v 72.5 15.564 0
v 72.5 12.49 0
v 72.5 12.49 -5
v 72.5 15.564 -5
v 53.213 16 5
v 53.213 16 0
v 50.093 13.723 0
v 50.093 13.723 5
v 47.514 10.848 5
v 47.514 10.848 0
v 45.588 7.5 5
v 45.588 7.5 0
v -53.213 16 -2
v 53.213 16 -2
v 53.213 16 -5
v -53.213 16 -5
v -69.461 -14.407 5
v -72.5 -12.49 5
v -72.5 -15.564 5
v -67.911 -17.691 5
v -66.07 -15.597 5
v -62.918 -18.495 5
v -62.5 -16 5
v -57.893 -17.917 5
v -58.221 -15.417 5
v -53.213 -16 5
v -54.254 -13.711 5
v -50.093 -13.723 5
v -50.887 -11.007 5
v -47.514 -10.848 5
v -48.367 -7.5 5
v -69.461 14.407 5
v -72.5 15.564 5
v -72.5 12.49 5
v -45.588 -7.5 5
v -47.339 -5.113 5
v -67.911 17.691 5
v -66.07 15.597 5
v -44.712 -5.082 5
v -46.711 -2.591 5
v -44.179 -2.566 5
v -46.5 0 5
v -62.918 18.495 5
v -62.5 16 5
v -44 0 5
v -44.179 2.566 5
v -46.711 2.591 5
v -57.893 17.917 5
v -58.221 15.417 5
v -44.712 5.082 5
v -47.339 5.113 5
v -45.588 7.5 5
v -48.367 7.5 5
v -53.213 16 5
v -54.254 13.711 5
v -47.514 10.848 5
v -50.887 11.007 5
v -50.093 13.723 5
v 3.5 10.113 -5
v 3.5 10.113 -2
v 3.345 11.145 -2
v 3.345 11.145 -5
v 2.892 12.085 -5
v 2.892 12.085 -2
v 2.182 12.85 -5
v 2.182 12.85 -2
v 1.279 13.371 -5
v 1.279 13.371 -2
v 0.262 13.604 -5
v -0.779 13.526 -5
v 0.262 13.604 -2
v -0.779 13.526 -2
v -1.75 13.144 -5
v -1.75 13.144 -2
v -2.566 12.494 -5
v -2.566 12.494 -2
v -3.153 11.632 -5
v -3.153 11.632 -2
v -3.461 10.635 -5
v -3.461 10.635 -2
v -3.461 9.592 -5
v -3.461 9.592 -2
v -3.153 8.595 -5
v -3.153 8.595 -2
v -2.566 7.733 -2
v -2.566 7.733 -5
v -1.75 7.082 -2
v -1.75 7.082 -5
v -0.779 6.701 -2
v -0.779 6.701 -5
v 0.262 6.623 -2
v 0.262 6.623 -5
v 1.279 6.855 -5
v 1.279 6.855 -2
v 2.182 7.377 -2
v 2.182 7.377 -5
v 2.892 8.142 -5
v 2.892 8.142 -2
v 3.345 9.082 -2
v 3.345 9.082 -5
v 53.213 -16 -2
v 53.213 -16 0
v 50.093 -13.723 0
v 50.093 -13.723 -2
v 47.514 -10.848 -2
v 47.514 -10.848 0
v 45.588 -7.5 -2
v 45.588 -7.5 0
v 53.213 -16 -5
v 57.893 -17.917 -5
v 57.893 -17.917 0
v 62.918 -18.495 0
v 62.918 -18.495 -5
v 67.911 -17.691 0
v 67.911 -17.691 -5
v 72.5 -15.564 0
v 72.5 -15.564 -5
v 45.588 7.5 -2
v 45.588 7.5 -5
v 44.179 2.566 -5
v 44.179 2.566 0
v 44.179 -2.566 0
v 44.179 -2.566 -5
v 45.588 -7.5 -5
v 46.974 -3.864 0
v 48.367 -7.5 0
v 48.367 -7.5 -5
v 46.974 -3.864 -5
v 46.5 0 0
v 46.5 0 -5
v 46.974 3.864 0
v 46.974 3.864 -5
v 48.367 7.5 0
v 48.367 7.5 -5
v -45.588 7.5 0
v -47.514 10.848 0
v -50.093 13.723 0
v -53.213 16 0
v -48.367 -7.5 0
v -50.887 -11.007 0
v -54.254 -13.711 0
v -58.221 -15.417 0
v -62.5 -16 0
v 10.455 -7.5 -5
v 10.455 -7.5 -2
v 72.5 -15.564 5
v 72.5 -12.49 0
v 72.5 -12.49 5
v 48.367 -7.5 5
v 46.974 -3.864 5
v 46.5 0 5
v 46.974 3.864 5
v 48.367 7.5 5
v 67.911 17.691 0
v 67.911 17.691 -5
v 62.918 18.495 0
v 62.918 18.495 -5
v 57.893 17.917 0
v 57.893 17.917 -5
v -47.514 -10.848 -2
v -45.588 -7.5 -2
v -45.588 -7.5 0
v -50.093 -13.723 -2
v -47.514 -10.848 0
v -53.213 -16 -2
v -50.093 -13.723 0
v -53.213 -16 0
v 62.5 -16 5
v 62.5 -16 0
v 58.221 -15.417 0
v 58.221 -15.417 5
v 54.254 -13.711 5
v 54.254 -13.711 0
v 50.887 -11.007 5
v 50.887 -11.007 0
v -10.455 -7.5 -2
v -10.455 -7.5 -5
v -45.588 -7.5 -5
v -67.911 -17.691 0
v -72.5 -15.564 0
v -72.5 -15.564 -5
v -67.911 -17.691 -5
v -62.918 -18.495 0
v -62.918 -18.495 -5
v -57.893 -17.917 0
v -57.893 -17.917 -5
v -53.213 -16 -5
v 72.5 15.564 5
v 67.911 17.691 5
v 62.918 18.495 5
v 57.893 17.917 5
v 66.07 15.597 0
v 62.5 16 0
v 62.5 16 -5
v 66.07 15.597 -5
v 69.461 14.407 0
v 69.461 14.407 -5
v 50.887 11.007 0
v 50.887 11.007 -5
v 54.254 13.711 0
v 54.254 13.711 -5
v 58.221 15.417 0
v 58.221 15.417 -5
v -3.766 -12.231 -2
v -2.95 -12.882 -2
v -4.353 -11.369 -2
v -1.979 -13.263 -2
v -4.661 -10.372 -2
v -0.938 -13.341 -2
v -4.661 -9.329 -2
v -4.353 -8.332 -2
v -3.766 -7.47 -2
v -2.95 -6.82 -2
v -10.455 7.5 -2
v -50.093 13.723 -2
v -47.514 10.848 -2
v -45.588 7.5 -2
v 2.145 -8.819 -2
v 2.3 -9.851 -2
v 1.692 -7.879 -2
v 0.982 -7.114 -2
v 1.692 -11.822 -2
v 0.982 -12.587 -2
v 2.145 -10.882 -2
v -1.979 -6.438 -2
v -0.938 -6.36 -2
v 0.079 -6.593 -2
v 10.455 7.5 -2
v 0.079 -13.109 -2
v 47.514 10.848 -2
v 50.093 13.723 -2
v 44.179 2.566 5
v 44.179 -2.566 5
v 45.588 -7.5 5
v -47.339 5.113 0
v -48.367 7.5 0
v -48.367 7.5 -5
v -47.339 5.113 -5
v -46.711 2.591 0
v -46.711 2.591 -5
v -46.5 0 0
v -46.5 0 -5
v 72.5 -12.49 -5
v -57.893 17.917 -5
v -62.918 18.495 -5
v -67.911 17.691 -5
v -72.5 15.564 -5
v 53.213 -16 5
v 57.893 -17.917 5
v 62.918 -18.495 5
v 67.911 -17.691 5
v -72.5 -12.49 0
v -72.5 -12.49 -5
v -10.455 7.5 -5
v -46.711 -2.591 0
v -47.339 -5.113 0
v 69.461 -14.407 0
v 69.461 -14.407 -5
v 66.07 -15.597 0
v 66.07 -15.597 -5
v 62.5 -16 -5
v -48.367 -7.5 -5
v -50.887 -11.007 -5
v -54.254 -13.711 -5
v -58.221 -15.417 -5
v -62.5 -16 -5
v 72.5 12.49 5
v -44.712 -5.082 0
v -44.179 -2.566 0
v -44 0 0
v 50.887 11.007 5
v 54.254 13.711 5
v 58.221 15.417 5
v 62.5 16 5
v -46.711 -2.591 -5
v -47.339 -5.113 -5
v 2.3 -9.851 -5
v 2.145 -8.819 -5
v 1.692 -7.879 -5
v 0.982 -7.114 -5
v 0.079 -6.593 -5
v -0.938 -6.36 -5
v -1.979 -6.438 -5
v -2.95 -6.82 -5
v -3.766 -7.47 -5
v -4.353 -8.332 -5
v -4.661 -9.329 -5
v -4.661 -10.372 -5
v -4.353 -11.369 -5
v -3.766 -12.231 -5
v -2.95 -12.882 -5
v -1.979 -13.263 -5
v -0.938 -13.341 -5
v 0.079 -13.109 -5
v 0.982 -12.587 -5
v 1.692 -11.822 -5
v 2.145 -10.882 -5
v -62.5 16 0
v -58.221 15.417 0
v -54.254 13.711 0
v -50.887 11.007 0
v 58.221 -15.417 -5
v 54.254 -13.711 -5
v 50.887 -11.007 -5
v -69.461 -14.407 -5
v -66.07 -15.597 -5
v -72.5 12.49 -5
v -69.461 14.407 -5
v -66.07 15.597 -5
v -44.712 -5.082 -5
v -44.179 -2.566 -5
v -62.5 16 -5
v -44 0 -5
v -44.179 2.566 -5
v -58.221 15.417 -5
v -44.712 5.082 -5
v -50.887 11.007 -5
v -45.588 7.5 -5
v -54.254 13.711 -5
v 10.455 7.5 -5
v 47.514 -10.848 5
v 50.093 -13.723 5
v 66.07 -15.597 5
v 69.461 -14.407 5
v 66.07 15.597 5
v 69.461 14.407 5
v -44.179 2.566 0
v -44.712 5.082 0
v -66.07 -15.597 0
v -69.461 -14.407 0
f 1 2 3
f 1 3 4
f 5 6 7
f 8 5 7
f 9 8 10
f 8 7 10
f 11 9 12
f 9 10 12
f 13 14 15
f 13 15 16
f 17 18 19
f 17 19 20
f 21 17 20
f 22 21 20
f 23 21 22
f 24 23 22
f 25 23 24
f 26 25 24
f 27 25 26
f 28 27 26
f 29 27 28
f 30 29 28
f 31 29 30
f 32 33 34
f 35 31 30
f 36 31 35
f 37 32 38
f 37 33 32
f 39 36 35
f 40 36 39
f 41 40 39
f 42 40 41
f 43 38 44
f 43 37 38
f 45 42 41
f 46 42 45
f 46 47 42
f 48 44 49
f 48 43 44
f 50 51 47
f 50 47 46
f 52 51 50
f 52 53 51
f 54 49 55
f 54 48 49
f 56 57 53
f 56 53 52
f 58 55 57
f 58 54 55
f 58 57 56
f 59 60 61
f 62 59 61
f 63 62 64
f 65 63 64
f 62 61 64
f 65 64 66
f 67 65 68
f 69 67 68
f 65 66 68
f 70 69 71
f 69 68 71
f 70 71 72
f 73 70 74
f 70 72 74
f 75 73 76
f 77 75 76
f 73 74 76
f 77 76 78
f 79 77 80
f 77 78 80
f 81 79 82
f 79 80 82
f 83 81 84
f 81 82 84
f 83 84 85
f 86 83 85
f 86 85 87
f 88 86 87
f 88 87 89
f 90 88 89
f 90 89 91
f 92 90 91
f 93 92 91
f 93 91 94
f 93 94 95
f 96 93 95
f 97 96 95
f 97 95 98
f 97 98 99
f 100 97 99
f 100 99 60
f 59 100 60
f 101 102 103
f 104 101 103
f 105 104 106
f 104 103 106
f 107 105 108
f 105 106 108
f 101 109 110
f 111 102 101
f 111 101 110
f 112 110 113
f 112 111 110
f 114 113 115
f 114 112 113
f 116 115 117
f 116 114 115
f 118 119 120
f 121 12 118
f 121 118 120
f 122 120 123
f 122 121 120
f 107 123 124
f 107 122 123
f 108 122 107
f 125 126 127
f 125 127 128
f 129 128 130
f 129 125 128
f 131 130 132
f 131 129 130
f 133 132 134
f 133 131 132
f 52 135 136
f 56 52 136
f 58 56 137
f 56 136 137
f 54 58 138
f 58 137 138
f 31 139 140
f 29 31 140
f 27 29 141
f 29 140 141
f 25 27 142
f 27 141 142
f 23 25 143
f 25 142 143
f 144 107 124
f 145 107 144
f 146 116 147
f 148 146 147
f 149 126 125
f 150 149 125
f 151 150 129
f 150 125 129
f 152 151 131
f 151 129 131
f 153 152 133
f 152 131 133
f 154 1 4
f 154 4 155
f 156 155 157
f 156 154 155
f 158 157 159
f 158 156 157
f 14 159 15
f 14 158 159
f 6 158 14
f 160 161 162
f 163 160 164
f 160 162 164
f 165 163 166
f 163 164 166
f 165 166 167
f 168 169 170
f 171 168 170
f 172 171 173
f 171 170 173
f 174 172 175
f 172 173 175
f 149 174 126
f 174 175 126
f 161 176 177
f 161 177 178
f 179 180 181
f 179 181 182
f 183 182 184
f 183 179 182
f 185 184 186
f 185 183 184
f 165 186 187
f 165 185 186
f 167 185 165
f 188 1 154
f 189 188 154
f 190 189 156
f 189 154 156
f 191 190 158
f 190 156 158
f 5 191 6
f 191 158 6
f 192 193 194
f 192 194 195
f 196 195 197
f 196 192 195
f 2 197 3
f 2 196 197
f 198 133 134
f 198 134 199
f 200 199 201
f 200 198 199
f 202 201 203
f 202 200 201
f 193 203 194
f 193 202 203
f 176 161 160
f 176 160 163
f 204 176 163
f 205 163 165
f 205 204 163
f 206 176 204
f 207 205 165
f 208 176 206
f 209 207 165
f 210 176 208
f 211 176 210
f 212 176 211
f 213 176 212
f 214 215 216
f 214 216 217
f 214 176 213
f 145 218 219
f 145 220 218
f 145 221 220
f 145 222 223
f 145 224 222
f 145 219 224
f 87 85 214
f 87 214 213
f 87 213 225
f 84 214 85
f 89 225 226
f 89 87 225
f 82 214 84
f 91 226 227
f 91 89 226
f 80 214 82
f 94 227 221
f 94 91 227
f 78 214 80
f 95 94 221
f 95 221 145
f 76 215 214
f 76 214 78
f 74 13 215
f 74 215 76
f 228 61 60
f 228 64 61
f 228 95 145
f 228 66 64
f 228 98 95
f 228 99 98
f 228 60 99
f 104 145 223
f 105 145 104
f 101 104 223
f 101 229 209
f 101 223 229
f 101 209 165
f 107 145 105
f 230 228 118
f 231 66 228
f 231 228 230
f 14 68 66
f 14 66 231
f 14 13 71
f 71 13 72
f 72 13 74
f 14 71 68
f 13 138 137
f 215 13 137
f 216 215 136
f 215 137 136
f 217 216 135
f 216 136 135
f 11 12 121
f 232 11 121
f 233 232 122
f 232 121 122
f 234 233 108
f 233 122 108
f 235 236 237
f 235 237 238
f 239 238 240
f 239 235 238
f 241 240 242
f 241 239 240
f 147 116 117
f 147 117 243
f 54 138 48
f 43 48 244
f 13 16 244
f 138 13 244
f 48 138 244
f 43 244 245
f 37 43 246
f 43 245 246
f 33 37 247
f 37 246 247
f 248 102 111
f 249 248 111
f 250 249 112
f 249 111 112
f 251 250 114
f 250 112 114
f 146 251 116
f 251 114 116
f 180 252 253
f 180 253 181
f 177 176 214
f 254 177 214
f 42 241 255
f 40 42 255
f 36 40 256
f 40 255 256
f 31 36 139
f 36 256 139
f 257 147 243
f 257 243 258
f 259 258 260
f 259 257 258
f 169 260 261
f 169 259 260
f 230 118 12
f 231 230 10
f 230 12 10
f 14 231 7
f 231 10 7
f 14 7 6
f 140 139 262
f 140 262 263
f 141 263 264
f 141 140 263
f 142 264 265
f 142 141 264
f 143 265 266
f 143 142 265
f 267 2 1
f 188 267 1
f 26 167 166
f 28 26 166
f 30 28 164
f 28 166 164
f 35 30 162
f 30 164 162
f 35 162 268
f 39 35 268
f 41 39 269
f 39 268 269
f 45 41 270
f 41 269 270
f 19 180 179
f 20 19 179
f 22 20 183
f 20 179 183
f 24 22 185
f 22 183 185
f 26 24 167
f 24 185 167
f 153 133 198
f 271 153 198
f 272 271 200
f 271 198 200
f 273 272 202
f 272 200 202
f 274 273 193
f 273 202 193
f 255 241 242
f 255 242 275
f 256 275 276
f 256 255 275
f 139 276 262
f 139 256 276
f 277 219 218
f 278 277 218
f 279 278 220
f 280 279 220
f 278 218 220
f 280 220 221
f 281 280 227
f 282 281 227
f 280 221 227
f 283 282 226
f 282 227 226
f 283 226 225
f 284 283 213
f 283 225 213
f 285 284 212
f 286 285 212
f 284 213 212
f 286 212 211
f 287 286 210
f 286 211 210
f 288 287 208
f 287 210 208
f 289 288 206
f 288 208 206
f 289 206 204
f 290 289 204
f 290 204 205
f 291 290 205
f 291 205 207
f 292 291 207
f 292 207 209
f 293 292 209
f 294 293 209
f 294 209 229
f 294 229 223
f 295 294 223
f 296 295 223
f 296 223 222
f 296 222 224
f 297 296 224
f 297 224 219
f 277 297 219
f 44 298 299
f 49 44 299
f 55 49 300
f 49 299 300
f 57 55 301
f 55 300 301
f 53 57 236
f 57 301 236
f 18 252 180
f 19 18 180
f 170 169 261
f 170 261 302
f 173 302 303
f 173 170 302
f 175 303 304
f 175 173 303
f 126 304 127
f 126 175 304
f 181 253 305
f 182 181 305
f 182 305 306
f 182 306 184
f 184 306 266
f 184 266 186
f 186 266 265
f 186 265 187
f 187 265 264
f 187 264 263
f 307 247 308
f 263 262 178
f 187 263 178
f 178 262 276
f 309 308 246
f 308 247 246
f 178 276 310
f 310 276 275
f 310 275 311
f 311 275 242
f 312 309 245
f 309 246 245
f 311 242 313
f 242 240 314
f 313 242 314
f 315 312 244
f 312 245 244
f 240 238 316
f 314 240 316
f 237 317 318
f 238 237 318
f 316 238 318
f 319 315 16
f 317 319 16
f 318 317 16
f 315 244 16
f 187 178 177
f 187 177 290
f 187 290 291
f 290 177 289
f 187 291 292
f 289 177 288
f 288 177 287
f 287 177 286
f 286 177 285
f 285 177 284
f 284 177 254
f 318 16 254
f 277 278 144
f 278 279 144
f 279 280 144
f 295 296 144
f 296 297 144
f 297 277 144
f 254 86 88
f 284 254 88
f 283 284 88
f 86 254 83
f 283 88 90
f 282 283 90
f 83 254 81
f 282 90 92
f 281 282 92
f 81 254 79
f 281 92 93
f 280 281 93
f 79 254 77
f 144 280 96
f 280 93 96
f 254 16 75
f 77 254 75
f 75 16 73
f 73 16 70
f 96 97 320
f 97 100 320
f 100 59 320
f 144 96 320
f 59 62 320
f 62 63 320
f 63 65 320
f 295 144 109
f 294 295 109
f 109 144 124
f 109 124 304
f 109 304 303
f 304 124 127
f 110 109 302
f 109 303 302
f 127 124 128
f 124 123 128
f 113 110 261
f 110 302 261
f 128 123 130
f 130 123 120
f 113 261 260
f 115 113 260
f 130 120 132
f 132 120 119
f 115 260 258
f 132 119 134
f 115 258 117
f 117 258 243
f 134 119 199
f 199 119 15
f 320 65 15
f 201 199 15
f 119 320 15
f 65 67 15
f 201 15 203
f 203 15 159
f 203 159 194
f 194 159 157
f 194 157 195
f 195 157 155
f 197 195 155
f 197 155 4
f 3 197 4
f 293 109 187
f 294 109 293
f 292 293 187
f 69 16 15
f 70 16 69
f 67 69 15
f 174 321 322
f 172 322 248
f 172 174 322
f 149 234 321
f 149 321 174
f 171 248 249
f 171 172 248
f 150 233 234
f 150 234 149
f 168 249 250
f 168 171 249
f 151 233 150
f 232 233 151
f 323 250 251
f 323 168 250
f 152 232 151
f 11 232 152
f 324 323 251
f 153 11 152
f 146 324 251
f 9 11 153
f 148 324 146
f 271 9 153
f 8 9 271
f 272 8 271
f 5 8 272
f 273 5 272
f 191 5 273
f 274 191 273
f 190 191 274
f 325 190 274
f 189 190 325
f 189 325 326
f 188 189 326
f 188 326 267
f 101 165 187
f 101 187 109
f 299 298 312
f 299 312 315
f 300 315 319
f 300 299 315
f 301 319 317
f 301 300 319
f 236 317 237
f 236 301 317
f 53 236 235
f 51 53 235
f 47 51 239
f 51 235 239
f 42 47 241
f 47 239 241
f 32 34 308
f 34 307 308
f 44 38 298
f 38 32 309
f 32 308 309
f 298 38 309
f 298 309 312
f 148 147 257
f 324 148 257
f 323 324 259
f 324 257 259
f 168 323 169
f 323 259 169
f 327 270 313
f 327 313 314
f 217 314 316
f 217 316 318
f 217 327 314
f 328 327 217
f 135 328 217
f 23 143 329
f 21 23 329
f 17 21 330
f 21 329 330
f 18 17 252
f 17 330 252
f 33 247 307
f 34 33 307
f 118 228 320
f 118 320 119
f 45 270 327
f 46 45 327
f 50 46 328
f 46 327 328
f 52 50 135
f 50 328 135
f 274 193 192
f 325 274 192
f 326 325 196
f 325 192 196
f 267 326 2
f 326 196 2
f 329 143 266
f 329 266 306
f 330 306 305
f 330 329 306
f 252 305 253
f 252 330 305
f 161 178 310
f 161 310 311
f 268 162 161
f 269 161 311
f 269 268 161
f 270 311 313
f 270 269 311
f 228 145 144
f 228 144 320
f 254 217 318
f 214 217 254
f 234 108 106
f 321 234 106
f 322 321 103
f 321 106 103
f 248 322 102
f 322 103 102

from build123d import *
from build123d import SkipClean  # not in build123d's __all__

# Parameters (mm, degrees)
F0_W     = 20.9095849469
F0_H     = 15
F1_DEPTH = 5
F2_DEPTH = 5
F3_R     = 3.5
F4_DEPTH = 2
F5_DEPTH = 5


# Not quite as in the source:
# - after a boolean that leaves OpenCascade's solid faulty, fix() repairs it


with BuildPart() as f1:
    # F0 (on Top) → F1 (new body)
    with BuildSketch(Plane.XY):
        with BuildLine():
            Line((-62.5, 16), (-53.2129121895, 16))
            ThreePointArc((-53.2129121895, 16), (-62.9177339073, 18.4952831388), (-72.5, 15.5643824163))
            Line((-72.5, 15.5643824163), (-72.5, 12.4899959968))
            ThreePointArc((-72.5, 12.4899959968), (-67.7990595416, 15.0970185128), (-62.5, 16))
        make_face()
        with BuildLine():
            ThreePointArc((-72.5, -15.5643824163), (-62.9177339073, -18.4952831388), (-53.2129121895, -16))
            Line((-53.2129121895, -16), (-62.5, -16))
            ThreePointArc((-62.5, -16), (-67.7990595416, -15.0970185128), (-72.5, -12.4899959968))
            Line((-72.5, -12.4899959968), (-72.5, -15.5643824163))
        make_face()
        with BuildLine():
            Line((-48.3667059749, 7.5), (-45.5884654747, 7.5))
            ThreePointArc((-45.5884654747, 7.5), (-48.7284912565, 12.3529570114), (-53.2129121895, 16))
            Line((-53.2129121895, 16), (-62.5, 16))
            ThreePointArc((-62.5, 16), (-54.2537887488, 13.7113092008), (-48.3667059749, 7.5))
        make_face()
        with BuildLine():
            ThreePointArc((-53.2129121895, -16), (-48.7284912565, -12.3529570114), (-45.5884654747, -7.5))
            Line((-45.5884654747, -7.5), (-48.3667059749, -7.5))
            ThreePointArc((-48.3667059749, -7.5), (-54.2537887488, -13.7113092008), (-62.5, -16))
            Line((-62.5, -16), (-53.2129121895, -16))
        make_face()
        with BuildLine():
            ThreePointArc((-44, 0), (-44.4014725914, 3.8331847909), (-45.5884654747, 7.5))
            Line((-45.5884654747, 7.5), (-48.3667059749, 7.5))
            ThreePointArc((-48.3667059749, 7.5), (-46.9736883903, 3.86440782), (-46.5, 0))
            ThreePointArc((-46.5, 0), (-46.9736883903, -3.86440782), (-48.3667059749, -7.5))
            Line((-48.3667059749, -7.5), (-45.5884654747, -7.5))
            ThreePointArc((-45.5884654747, -7.5), (-44.4014725914, -3.8331847909), (-44, 0))
        make_face()
        with BuildLine():
            ThreePointArc((-72.5, -15.5643824163), (-62.9177339073, -18.4952831388), (-53.2129121895, -16))
            Line((-53.2129121895, -16), (-62.5, -16))
            ThreePointArc((-62.5, -16), (-67.7990595416, -15.0970185128), (-72.5, -12.4899959968))
            Line((-72.5, -12.4899959968), (-72.5, -15.5643824163))
        make_face()
        with BuildLine():
            Line((-62.5, 16), (-53.2129121895, 16))
            ThreePointArc((-53.2129121895, 16), (-62.9177339073, 18.4952831388), (-72.5, 15.5643824163))
            Line((-72.5, 15.5643824163), (-72.5, 12.4899959968))
            ThreePointArc((-72.5, 12.4899959968), (-67.7990595416, 15.0970185128), (-62.5, 16))
        make_face()
        with BuildLine():
            ThreePointArc((72.5, 15.5643824163), (62.9177339073, 18.4952831388), (53.2129121895, 16))
            Line((53.2129121895, 16), (62.5, 16))
            ThreePointArc((62.5, 16), (67.7990595416, 15.0970185128), (72.5, 12.4899959968))
            Line((72.5, 12.4899959968), (72.5, 15.5643824163))
        make_face()
        with BuildLine():
            ThreePointArc((72.5, 15.5643824163), (62.9177339073, 18.4952831388), (53.2129121895, 16))
            Line((53.2129121895, 16), (62.5, 16))
            ThreePointArc((62.5, 16), (67.7990595416, 15.0970185128), (72.5, 12.4899959968))
            Line((72.5, 12.4899959968), (72.5, 15.5643824163))
        make_face()
        with BuildLine():
            Line((62.5, -16), (53.2129121895, -16))
            ThreePointArc((53.2129121895, -16), (62.9177339073, -18.4952831388), (72.5, -15.5643824163))
            Line((72.5, -15.5643824163), (72.5, -12.4899959968))
            ThreePointArc((72.5, -12.4899959968), (67.7990595416, -15.0970185128), (62.5, -16))
        make_face()
        with BuildLine():
            ThreePointArc((53.2129121895, 16), (48.7284912565, 12.3529570114), (45.5884654747, 7.5))
            Line((45.5884654747, 7.5), (48.3667059749, 7.5))
            ThreePointArc((48.3667059749, 7.5), (54.2537887488, 13.7113092008), (62.5, 16))
            Line((62.5, 16), (53.2129121895, 16))
        make_face()
        with BuildLine():
            Line((48.3667059749, 7.5), (45.5884654747, 7.5))
            ThreePointArc((45.5884654747, 7.5), (44, 0), (45.5884654747, -7.5))
            Line((45.5884654747, -7.5), (48.3667059749, -7.5))
            ThreePointArc((48.3667059749, -7.5), (46.5, 0), (48.3667059749, 7.5))
        make_face()
        with BuildLine():
            Line((48.3667059749, -7.5), (45.5884654747, -7.5))
            ThreePointArc((45.5884654747, -7.5), (48.7284912565, -12.3529570114), (53.2129121895, -16))
            Line((53.2129121895, -16), (62.5, -16))
            ThreePointArc((62.5, -16), (54.2537887488, -13.7113092008), (48.3667059749, -7.5))
        make_face()
        with BuildLine():
            Line((62.5, -16), (53.2129121895, -16))
            ThreePointArc((53.2129121895, -16), (62.9177339073, -18.4952831388), (72.5, -15.5643824163))
            Line((72.5, -15.5643824163), (72.5, -12.4899959968))
            ThreePointArc((72.5, -12.4899959968), (67.7990595416, -15.0970185128), (62.5, -16))
        make_face()
        with BuildLine():
            Line((10.4547924735, -7.5), (-10.4547924735, -7.5))
            Line((-10.4547924735, -7.5), (-45.5884654747, -7.5))
            ThreePointArc((-45.5884654747, -7.5), (-48.7284912565, -12.3529570114), (-53.2129121895, -16))
            Line((-53.2129121895, -16), (53.2129121895, -16))
            ThreePointArc((53.2129121895, -16), (48.7284912565, -12.3529570114), (45.5884654747, -7.5))
            Line((45.5884654747, -7.5), (10.4547924735, -7.5))
        make_face()
        with BuildLine():
            Line((-45.5884654747, 7.5), (-10.4547924735, 7.5))
            Line((-10.4547924735, 7.5), (10.4547924735, 7.5))
            Line((10.4547924735, 7.5), (45.5884654747, 7.5))
            ThreePointArc((45.5884654747, 7.5), (48.7284912565, 12.3529570114), (53.2129121895, 16))
            Line((53.2129121895, 16), (-53.2129121895, 16))
            ThreePointArc((-53.2129121895, 16), (-48.7284912565, 12.3529570114), (-45.5884654747, 7.5))
        make_face()
        Rectangle(F0_W, F0_H)
    extrude(amount=-F1_DEPTH)

    # F0 (on Top) → F2 (join)
    with BuildSketch(Plane.XY):
        with BuildLine():
            Line((-62.5, 16), (-53.2129121895, 16))
            ThreePointArc((-53.2129121895, 16), (-62.9177339073, 18.4952831388), (-72.5, 15.5643824163))
            Line((-72.5, 15.5643824163), (-72.5, 12.4899959968))
            ThreePointArc((-72.5, 12.4899959968), (-67.7990595416, 15.0970185128), (-62.5, 16))
        make_face()
        with BuildLine():
            ThreePointArc((-72.5, -15.5643824163), (-62.9177339073, -18.4952831388), (-53.2129121895, -16))
            Line((-53.2129121895, -16), (-62.5, -16))
            ThreePointArc((-62.5, -16), (-67.7990595416, -15.0970185128), (-72.5, -12.4899959968))
            Line((-72.5, -12.4899959968), (-72.5, -15.5643824163))
        make_face()
        with BuildLine():
            Line((-48.3667059749, 7.5), (-45.5884654747, 7.5))
            ThreePointArc((-45.5884654747, 7.5), (-48.7284912565, 12.3529570114), (-53.2129121895, 16))
            Line((-53.2129121895, 16), (-62.5, 16))
            ThreePointArc((-62.5, 16), (-54.2537887488, 13.7113092008), (-48.3667059749, 7.5))
        make_face()
        with BuildLine():
            ThreePointArc((-53.2129121895, -16), (-48.7284912565, -12.3529570114), (-45.5884654747, -7.5))
            Line((-45.5884654747, -7.5), (-48.3667059749, -7.5))
            ThreePointArc((-48.3667059749, -7.5), (-54.2537887488, -13.7113092008), (-62.5, -16))
            Line((-62.5, -16), (-53.2129121895, -16))
        make_face()
        with BuildLine():
            ThreePointArc((-44, 0), (-44.4014725914, 3.8331847909), (-45.5884654747, 7.5))
            Line((-45.5884654747, 7.5), (-48.3667059749, 7.5))
            ThreePointArc((-48.3667059749, 7.5), (-46.9736883903, 3.86440782), (-46.5, 0))
            ThreePointArc((-46.5, 0), (-46.9736883903, -3.86440782), (-48.3667059749, -7.5))
            Line((-48.3667059749, -7.5), (-45.5884654747, -7.5))
            ThreePointArc((-45.5884654747, -7.5), (-44.4014725914, -3.8331847909), (-44, 0))
        make_face()
        with BuildLine():
            Line((-62.5, 16), (-53.2129121895, 16))
            ThreePointArc((-53.2129121895, 16), (-62.9177339073, 18.4952831388), (-72.5, 15.5643824163))
            Line((-72.5, 15.5643824163), (-72.5, 12.4899959968))
            ThreePointArc((-72.5, 12.4899959968), (-67.7990595416, 15.0970185128), (-62.5, 16))
        make_face()
        with BuildLine():
            ThreePointArc((-72.5, -15.5643824163), (-62.9177339073, -18.4952831388), (-53.2129121895, -16))
            Line((-53.2129121895, -16), (-62.5, -16))
            ThreePointArc((-62.5, -16), (-67.7990595416, -15.0970185128), (-72.5, -12.4899959968))
            Line((-72.5, -12.4899959968), (-72.5, -15.5643824163))
        make_face()
        with BuildLine():
            Line((62.5, -16), (53.2129121895, -16))
            ThreePointArc((53.2129121895, -16), (62.9177339073, -18.4952831388), (72.5, -15.5643824163))
            Line((72.5, -15.5643824163), (72.5, -12.4899959968))
            ThreePointArc((72.5, -12.4899959968), (67.7990595416, -15.0970185128), (62.5, -16))
        make_face()
        with BuildLine():
            ThreePointArc((72.5, 15.5643824163), (62.9177339073, 18.4952831388), (53.2129121895, 16))
            Line((53.2129121895, 16), (62.5, 16))
            ThreePointArc((62.5, 16), (67.7990595416, 15.0970185128), (72.5, 12.4899959968))
            Line((72.5, 12.4899959968), (72.5, 15.5643824163))
        make_face()
        with BuildLine():
            Line((62.5, -16), (53.2129121895, -16))
            ThreePointArc((53.2129121895, -16), (62.9177339073, -18.4952831388), (72.5, -15.5643824163))
            Line((72.5, -15.5643824163), (72.5, -12.4899959968))
            ThreePointArc((72.5, -12.4899959968), (67.7990595416, -15.0970185128), (62.5, -16))
        make_face()
        with BuildLine():
            ThreePointArc((53.2129121895, 16), (48.7284912565, 12.3529570114), (45.5884654747, 7.5))
            Line((45.5884654747, 7.5), (48.3667059749, 7.5))
            ThreePointArc((48.3667059749, 7.5), (54.2537887488, 13.7113092008), (62.5, 16))
            Line((62.5, 16), (53.2129121895, 16))
        make_face()
        with BuildLine():
            Line((48.3667059749, 7.5), (45.5884654747, 7.5))
            ThreePointArc((45.5884654747, 7.5), (44, 0), (45.5884654747, -7.5))
            Line((45.5884654747, -7.5), (48.3667059749, -7.5))
            ThreePointArc((48.3667059749, -7.5), (46.5, 0), (48.3667059749, 7.5))
        make_face()
        with BuildLine():
            Line((48.3667059749, -7.5), (45.5884654747, -7.5))
            ThreePointArc((45.5884654747, -7.5), (48.7284912565, -12.3529570114), (53.2129121895, -16))
            Line((53.2129121895, -16), (62.5, -16))
            ThreePointArc((62.5, -16), (54.2537887488, -13.7113092008), (48.3667059749, -7.5))
        make_face()
        with BuildLine():
            ThreePointArc((72.5, 15.5643824163), (62.9177339073, 18.4952831388), (53.2129121895, 16))
            Line((53.2129121895, 16), (62.5, 16))
            ThreePointArc((62.5, 16), (67.7990595416, 15.0970185128), (72.5, 12.4899959968))
            Line((72.5, 12.4899959968), (72.5, 15.5643824163))
        make_face()
    extrude(amount=F2_DEPTH)

    # F3 (on face) → F4 (cut)
    with BuildSketch(Plane.XY):
        with BuildLine():
            ThreePointArc((45.5884654747, 7.5), (48.7284912565, 12.3529570114), (53.2129121895, 16))
            Line((53.2129121895, 16), (-53.2129121895, 16))
            ThreePointArc((-53.2129121895, 16), (-48.7284912565, 12.3529570114), (-45.5884654747, 7.5))
            Line((-45.5884654747, 7.5), (-10.4547924735, 7.5))
            Line((-10.4547924735, 7.5), (-10.4547924735, -7.5))
            Line((-10.4547924735, -7.5), (-45.5884654747, -7.5))
            ThreePointArc((-45.5884654747, -7.5), (-48.7284912565, -12.3529570114), (-53.2129121895, -16))
            Line((-53.2129121895, -16), (53.2129121895, -16))
            ThreePointArc((53.2129121895, -16), (48.7284912565, -12.3529570114), (45.5884654747, -7.5))
            Line((45.5884654747, -7.5), (10.4547924735, -7.5))
            Line((10.4547924735, -7.5), (10.4547924735, 7.5))
            Line((10.4547924735, 7.5), (45.5884654747, 7.5))
        make_face()
        with Locations((-1.2, -9.8506268114)):
            Circle(F3_R, mode=Mode.SUBTRACT)
        with Locations((0, 10.1133407302)):
            Circle(F3_R, mode=Mode.SUBTRACT)
        with BuildLine():
            ThreePointArc((45.5884654747, 7.5), (48.7284912565, 12.3529570114), (53.2129121895, 16))
            Line((53.2129121895, 16), (-53.2129121895, 16))
            ThreePointArc((-53.2129121895, 16), (-48.7284912565, 12.3529570114), (-45.5884654747, 7.5))
            Line((-45.5884654747, 7.5), (-10.4547924735, 7.5))
            Line((-10.4547924735, 7.5), (-10.4547924735, -7.5))
            Line((-10.4547924735, -7.5), (-45.5884654747, -7.5))
            ThreePointArc((-45.5884654747, -7.5), (-48.7284912565, -12.3529570114), (-53.2129121895, -16))
            Line((-53.2129121895, -16), (53.2129121895, -16))
            ThreePointArc((53.2129121895, -16), (48.7284912565, -12.3529570114), (45.5884654747, -7.5))
            Line((45.5884654747, -7.5), (10.4547924735, -7.5))
            Line((10.4547924735, -7.5), (10.4547924735, 7.5))
            Line((10.4547924735, 7.5), (45.5884654747, 7.5))
        make_face()
        with Locations((-1.2, -9.8506268114)):
            Circle(F3_R, mode=Mode.SUBTRACT)
        with Locations((0, 10.1133407302)):
            Circle(F3_R, mode=Mode.SUBTRACT)
    with SkipClean():  # cleaning this boolean's faces spoils the solid; the shape is the same uncleaned
        extrude(amount=-F4_DEPTH, mode=Mode.SUBTRACT)

    # F5 (cut, through all): faces of the model
    f5_faces = [f1.faces().sort_by_distance(p)[0] for p in [
        (0, 10.1133407302, 0),
        (-1.2, -9.8506268114, 0),
    ]]
    extrude(f5_faces, amount=-F5_DEPTH, mode=Mode.SUBTRACT)

    add(f1.part.fix(), mode=Mode.REPLACE)


solid = f1.part
